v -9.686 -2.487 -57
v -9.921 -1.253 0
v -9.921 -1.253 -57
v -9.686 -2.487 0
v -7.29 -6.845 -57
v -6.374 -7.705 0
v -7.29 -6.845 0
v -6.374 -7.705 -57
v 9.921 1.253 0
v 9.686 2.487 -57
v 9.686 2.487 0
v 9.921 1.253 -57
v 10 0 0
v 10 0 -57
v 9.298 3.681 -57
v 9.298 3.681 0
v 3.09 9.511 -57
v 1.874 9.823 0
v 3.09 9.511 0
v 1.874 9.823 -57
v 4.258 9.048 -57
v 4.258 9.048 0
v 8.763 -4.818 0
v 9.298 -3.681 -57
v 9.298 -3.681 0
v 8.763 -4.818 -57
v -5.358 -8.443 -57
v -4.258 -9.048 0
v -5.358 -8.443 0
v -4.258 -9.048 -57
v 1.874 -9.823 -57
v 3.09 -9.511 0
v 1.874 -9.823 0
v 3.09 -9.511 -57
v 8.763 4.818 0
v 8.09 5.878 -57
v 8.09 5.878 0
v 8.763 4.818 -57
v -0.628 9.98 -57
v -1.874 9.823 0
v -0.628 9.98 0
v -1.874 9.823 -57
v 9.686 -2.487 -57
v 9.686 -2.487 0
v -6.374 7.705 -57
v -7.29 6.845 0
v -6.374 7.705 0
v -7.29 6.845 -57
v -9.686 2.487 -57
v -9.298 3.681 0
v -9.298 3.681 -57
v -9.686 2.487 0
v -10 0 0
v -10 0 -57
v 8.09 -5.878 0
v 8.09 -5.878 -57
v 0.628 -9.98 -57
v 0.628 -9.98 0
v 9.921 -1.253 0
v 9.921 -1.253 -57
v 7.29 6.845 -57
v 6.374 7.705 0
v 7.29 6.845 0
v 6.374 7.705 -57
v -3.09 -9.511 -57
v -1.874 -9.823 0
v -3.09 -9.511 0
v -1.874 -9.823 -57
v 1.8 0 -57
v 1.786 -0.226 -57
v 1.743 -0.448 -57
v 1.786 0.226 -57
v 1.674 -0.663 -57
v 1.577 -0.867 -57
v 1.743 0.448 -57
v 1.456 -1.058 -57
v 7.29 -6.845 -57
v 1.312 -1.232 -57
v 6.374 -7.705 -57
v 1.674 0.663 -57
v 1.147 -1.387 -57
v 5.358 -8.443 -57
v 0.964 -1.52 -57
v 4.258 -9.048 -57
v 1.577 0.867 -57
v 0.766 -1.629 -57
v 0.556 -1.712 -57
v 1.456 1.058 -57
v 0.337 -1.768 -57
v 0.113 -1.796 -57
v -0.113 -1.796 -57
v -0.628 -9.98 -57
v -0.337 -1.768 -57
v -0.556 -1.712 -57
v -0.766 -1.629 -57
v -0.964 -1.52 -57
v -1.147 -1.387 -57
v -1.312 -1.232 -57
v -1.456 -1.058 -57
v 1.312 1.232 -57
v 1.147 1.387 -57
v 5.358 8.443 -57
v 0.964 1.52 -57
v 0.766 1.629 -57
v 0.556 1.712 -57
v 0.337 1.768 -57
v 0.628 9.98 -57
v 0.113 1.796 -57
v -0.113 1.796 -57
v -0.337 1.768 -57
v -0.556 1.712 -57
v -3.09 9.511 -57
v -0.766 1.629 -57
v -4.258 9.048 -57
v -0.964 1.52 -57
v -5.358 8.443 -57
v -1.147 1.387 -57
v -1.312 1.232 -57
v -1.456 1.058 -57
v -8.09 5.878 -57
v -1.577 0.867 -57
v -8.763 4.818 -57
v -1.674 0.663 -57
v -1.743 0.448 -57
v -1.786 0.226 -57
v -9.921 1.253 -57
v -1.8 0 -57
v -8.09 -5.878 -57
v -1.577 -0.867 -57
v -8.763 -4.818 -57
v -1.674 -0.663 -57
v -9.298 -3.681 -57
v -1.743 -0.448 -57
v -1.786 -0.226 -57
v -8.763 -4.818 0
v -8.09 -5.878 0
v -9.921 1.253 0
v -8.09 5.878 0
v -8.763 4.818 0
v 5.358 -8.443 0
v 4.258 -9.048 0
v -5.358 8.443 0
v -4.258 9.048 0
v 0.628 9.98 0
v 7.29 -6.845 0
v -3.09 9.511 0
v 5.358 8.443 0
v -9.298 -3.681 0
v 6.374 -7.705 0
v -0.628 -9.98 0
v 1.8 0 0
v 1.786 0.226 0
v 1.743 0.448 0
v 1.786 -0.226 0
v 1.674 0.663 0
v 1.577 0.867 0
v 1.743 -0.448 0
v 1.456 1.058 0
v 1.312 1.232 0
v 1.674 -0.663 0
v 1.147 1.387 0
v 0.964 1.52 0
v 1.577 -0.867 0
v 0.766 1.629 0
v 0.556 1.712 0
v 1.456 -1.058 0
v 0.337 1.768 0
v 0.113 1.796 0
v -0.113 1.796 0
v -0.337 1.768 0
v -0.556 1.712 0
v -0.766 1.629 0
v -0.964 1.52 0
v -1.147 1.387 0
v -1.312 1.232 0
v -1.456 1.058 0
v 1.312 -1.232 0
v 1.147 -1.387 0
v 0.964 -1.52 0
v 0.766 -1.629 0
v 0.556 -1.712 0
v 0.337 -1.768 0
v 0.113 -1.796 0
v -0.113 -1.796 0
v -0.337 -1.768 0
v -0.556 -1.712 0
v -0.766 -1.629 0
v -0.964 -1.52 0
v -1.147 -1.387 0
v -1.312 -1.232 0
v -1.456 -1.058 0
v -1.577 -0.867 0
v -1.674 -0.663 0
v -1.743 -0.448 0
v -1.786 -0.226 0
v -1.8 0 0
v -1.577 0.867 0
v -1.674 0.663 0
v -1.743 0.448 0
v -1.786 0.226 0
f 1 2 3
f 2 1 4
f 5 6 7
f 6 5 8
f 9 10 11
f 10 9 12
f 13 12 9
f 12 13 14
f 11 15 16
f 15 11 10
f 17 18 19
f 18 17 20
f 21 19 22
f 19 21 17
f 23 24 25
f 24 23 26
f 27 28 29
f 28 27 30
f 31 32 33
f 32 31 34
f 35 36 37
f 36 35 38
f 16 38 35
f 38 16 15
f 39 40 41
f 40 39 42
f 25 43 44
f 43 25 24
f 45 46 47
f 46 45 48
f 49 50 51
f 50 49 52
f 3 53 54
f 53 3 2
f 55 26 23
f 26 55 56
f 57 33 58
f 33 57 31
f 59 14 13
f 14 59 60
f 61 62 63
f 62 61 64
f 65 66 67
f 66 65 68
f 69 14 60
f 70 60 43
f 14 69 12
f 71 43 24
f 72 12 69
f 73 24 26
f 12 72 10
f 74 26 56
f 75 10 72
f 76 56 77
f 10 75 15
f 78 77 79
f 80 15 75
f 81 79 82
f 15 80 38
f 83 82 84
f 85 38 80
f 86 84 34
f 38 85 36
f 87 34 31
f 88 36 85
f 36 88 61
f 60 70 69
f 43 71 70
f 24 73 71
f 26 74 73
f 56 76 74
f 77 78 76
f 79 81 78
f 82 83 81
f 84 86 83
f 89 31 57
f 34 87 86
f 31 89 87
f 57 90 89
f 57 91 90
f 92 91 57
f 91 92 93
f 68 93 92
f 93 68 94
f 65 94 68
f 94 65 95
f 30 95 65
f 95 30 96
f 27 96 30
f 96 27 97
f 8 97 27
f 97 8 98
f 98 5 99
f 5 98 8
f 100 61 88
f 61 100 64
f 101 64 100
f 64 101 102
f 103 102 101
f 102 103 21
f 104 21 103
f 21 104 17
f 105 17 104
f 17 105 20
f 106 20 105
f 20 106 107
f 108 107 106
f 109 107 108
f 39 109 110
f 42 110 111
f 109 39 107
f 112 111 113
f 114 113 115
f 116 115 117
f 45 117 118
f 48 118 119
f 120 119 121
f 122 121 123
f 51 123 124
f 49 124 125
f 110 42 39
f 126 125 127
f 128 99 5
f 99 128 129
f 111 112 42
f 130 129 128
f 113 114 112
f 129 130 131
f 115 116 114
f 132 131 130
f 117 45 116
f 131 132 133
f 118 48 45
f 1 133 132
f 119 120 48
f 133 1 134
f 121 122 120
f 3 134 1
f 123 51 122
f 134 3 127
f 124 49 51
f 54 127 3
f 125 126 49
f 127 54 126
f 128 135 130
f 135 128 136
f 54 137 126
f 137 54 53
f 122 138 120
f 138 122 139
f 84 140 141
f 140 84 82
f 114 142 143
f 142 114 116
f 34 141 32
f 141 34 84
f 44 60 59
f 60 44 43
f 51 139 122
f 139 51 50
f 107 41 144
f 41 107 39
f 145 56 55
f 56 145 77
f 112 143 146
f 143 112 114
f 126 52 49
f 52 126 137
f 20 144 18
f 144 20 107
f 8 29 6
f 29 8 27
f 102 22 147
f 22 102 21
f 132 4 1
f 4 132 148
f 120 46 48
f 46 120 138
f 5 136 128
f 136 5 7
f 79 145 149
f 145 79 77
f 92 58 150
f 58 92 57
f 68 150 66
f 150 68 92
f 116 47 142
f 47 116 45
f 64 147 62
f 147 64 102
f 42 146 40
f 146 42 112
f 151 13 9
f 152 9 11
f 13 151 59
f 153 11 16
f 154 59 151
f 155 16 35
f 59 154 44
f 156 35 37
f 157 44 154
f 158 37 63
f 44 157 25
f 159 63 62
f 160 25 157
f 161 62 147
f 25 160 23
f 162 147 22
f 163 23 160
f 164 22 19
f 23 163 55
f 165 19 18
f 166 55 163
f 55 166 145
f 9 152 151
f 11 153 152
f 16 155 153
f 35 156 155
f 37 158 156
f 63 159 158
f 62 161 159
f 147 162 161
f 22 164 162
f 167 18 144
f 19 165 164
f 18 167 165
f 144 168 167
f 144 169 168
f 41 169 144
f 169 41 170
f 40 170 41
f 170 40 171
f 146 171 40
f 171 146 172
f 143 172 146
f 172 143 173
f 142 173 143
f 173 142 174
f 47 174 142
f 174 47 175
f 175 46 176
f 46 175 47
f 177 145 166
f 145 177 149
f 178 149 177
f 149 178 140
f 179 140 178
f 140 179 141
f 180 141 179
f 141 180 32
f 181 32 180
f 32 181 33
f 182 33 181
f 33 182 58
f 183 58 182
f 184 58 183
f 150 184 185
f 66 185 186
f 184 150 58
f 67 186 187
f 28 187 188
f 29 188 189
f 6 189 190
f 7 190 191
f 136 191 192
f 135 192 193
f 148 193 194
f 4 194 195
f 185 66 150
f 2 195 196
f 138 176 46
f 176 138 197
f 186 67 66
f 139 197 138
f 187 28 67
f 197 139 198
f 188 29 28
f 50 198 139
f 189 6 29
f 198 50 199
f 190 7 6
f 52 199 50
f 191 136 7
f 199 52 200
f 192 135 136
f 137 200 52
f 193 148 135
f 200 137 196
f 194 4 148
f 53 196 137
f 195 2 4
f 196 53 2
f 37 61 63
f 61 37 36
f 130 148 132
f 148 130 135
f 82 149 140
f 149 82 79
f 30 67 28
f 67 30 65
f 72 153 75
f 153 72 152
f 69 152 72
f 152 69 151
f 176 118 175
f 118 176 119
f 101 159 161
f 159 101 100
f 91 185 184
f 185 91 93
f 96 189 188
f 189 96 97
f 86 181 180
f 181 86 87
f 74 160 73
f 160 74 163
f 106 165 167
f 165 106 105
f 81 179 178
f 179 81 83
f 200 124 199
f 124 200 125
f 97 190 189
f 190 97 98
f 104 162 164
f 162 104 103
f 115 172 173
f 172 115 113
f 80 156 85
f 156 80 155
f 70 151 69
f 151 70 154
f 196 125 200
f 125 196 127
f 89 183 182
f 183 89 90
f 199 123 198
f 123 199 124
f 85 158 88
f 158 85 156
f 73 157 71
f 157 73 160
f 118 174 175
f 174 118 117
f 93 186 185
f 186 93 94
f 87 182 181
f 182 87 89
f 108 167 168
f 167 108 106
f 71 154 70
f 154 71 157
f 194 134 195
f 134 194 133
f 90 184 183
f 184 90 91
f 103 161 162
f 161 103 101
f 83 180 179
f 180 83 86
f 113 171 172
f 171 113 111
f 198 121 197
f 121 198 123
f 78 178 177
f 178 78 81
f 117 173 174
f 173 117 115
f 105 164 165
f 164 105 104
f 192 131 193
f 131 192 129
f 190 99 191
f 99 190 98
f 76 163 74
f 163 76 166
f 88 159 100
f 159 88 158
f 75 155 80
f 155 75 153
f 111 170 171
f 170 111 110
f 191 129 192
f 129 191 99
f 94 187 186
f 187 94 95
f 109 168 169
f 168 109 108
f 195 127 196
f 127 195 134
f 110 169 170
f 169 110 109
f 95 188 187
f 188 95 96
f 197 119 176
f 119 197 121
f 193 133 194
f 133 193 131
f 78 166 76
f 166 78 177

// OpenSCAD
$fn = 50;


difference() {
	union() {
		translate(v = [0, 0, -57.0000000000]) {
			cylinder(h = 57, r = 10.0000000000);
		}
	}
	union() {
		#translate(v = [0, 0, -57]) {
			cylinder(h = 57, r = 1.8000000000);
		}
	}
}
